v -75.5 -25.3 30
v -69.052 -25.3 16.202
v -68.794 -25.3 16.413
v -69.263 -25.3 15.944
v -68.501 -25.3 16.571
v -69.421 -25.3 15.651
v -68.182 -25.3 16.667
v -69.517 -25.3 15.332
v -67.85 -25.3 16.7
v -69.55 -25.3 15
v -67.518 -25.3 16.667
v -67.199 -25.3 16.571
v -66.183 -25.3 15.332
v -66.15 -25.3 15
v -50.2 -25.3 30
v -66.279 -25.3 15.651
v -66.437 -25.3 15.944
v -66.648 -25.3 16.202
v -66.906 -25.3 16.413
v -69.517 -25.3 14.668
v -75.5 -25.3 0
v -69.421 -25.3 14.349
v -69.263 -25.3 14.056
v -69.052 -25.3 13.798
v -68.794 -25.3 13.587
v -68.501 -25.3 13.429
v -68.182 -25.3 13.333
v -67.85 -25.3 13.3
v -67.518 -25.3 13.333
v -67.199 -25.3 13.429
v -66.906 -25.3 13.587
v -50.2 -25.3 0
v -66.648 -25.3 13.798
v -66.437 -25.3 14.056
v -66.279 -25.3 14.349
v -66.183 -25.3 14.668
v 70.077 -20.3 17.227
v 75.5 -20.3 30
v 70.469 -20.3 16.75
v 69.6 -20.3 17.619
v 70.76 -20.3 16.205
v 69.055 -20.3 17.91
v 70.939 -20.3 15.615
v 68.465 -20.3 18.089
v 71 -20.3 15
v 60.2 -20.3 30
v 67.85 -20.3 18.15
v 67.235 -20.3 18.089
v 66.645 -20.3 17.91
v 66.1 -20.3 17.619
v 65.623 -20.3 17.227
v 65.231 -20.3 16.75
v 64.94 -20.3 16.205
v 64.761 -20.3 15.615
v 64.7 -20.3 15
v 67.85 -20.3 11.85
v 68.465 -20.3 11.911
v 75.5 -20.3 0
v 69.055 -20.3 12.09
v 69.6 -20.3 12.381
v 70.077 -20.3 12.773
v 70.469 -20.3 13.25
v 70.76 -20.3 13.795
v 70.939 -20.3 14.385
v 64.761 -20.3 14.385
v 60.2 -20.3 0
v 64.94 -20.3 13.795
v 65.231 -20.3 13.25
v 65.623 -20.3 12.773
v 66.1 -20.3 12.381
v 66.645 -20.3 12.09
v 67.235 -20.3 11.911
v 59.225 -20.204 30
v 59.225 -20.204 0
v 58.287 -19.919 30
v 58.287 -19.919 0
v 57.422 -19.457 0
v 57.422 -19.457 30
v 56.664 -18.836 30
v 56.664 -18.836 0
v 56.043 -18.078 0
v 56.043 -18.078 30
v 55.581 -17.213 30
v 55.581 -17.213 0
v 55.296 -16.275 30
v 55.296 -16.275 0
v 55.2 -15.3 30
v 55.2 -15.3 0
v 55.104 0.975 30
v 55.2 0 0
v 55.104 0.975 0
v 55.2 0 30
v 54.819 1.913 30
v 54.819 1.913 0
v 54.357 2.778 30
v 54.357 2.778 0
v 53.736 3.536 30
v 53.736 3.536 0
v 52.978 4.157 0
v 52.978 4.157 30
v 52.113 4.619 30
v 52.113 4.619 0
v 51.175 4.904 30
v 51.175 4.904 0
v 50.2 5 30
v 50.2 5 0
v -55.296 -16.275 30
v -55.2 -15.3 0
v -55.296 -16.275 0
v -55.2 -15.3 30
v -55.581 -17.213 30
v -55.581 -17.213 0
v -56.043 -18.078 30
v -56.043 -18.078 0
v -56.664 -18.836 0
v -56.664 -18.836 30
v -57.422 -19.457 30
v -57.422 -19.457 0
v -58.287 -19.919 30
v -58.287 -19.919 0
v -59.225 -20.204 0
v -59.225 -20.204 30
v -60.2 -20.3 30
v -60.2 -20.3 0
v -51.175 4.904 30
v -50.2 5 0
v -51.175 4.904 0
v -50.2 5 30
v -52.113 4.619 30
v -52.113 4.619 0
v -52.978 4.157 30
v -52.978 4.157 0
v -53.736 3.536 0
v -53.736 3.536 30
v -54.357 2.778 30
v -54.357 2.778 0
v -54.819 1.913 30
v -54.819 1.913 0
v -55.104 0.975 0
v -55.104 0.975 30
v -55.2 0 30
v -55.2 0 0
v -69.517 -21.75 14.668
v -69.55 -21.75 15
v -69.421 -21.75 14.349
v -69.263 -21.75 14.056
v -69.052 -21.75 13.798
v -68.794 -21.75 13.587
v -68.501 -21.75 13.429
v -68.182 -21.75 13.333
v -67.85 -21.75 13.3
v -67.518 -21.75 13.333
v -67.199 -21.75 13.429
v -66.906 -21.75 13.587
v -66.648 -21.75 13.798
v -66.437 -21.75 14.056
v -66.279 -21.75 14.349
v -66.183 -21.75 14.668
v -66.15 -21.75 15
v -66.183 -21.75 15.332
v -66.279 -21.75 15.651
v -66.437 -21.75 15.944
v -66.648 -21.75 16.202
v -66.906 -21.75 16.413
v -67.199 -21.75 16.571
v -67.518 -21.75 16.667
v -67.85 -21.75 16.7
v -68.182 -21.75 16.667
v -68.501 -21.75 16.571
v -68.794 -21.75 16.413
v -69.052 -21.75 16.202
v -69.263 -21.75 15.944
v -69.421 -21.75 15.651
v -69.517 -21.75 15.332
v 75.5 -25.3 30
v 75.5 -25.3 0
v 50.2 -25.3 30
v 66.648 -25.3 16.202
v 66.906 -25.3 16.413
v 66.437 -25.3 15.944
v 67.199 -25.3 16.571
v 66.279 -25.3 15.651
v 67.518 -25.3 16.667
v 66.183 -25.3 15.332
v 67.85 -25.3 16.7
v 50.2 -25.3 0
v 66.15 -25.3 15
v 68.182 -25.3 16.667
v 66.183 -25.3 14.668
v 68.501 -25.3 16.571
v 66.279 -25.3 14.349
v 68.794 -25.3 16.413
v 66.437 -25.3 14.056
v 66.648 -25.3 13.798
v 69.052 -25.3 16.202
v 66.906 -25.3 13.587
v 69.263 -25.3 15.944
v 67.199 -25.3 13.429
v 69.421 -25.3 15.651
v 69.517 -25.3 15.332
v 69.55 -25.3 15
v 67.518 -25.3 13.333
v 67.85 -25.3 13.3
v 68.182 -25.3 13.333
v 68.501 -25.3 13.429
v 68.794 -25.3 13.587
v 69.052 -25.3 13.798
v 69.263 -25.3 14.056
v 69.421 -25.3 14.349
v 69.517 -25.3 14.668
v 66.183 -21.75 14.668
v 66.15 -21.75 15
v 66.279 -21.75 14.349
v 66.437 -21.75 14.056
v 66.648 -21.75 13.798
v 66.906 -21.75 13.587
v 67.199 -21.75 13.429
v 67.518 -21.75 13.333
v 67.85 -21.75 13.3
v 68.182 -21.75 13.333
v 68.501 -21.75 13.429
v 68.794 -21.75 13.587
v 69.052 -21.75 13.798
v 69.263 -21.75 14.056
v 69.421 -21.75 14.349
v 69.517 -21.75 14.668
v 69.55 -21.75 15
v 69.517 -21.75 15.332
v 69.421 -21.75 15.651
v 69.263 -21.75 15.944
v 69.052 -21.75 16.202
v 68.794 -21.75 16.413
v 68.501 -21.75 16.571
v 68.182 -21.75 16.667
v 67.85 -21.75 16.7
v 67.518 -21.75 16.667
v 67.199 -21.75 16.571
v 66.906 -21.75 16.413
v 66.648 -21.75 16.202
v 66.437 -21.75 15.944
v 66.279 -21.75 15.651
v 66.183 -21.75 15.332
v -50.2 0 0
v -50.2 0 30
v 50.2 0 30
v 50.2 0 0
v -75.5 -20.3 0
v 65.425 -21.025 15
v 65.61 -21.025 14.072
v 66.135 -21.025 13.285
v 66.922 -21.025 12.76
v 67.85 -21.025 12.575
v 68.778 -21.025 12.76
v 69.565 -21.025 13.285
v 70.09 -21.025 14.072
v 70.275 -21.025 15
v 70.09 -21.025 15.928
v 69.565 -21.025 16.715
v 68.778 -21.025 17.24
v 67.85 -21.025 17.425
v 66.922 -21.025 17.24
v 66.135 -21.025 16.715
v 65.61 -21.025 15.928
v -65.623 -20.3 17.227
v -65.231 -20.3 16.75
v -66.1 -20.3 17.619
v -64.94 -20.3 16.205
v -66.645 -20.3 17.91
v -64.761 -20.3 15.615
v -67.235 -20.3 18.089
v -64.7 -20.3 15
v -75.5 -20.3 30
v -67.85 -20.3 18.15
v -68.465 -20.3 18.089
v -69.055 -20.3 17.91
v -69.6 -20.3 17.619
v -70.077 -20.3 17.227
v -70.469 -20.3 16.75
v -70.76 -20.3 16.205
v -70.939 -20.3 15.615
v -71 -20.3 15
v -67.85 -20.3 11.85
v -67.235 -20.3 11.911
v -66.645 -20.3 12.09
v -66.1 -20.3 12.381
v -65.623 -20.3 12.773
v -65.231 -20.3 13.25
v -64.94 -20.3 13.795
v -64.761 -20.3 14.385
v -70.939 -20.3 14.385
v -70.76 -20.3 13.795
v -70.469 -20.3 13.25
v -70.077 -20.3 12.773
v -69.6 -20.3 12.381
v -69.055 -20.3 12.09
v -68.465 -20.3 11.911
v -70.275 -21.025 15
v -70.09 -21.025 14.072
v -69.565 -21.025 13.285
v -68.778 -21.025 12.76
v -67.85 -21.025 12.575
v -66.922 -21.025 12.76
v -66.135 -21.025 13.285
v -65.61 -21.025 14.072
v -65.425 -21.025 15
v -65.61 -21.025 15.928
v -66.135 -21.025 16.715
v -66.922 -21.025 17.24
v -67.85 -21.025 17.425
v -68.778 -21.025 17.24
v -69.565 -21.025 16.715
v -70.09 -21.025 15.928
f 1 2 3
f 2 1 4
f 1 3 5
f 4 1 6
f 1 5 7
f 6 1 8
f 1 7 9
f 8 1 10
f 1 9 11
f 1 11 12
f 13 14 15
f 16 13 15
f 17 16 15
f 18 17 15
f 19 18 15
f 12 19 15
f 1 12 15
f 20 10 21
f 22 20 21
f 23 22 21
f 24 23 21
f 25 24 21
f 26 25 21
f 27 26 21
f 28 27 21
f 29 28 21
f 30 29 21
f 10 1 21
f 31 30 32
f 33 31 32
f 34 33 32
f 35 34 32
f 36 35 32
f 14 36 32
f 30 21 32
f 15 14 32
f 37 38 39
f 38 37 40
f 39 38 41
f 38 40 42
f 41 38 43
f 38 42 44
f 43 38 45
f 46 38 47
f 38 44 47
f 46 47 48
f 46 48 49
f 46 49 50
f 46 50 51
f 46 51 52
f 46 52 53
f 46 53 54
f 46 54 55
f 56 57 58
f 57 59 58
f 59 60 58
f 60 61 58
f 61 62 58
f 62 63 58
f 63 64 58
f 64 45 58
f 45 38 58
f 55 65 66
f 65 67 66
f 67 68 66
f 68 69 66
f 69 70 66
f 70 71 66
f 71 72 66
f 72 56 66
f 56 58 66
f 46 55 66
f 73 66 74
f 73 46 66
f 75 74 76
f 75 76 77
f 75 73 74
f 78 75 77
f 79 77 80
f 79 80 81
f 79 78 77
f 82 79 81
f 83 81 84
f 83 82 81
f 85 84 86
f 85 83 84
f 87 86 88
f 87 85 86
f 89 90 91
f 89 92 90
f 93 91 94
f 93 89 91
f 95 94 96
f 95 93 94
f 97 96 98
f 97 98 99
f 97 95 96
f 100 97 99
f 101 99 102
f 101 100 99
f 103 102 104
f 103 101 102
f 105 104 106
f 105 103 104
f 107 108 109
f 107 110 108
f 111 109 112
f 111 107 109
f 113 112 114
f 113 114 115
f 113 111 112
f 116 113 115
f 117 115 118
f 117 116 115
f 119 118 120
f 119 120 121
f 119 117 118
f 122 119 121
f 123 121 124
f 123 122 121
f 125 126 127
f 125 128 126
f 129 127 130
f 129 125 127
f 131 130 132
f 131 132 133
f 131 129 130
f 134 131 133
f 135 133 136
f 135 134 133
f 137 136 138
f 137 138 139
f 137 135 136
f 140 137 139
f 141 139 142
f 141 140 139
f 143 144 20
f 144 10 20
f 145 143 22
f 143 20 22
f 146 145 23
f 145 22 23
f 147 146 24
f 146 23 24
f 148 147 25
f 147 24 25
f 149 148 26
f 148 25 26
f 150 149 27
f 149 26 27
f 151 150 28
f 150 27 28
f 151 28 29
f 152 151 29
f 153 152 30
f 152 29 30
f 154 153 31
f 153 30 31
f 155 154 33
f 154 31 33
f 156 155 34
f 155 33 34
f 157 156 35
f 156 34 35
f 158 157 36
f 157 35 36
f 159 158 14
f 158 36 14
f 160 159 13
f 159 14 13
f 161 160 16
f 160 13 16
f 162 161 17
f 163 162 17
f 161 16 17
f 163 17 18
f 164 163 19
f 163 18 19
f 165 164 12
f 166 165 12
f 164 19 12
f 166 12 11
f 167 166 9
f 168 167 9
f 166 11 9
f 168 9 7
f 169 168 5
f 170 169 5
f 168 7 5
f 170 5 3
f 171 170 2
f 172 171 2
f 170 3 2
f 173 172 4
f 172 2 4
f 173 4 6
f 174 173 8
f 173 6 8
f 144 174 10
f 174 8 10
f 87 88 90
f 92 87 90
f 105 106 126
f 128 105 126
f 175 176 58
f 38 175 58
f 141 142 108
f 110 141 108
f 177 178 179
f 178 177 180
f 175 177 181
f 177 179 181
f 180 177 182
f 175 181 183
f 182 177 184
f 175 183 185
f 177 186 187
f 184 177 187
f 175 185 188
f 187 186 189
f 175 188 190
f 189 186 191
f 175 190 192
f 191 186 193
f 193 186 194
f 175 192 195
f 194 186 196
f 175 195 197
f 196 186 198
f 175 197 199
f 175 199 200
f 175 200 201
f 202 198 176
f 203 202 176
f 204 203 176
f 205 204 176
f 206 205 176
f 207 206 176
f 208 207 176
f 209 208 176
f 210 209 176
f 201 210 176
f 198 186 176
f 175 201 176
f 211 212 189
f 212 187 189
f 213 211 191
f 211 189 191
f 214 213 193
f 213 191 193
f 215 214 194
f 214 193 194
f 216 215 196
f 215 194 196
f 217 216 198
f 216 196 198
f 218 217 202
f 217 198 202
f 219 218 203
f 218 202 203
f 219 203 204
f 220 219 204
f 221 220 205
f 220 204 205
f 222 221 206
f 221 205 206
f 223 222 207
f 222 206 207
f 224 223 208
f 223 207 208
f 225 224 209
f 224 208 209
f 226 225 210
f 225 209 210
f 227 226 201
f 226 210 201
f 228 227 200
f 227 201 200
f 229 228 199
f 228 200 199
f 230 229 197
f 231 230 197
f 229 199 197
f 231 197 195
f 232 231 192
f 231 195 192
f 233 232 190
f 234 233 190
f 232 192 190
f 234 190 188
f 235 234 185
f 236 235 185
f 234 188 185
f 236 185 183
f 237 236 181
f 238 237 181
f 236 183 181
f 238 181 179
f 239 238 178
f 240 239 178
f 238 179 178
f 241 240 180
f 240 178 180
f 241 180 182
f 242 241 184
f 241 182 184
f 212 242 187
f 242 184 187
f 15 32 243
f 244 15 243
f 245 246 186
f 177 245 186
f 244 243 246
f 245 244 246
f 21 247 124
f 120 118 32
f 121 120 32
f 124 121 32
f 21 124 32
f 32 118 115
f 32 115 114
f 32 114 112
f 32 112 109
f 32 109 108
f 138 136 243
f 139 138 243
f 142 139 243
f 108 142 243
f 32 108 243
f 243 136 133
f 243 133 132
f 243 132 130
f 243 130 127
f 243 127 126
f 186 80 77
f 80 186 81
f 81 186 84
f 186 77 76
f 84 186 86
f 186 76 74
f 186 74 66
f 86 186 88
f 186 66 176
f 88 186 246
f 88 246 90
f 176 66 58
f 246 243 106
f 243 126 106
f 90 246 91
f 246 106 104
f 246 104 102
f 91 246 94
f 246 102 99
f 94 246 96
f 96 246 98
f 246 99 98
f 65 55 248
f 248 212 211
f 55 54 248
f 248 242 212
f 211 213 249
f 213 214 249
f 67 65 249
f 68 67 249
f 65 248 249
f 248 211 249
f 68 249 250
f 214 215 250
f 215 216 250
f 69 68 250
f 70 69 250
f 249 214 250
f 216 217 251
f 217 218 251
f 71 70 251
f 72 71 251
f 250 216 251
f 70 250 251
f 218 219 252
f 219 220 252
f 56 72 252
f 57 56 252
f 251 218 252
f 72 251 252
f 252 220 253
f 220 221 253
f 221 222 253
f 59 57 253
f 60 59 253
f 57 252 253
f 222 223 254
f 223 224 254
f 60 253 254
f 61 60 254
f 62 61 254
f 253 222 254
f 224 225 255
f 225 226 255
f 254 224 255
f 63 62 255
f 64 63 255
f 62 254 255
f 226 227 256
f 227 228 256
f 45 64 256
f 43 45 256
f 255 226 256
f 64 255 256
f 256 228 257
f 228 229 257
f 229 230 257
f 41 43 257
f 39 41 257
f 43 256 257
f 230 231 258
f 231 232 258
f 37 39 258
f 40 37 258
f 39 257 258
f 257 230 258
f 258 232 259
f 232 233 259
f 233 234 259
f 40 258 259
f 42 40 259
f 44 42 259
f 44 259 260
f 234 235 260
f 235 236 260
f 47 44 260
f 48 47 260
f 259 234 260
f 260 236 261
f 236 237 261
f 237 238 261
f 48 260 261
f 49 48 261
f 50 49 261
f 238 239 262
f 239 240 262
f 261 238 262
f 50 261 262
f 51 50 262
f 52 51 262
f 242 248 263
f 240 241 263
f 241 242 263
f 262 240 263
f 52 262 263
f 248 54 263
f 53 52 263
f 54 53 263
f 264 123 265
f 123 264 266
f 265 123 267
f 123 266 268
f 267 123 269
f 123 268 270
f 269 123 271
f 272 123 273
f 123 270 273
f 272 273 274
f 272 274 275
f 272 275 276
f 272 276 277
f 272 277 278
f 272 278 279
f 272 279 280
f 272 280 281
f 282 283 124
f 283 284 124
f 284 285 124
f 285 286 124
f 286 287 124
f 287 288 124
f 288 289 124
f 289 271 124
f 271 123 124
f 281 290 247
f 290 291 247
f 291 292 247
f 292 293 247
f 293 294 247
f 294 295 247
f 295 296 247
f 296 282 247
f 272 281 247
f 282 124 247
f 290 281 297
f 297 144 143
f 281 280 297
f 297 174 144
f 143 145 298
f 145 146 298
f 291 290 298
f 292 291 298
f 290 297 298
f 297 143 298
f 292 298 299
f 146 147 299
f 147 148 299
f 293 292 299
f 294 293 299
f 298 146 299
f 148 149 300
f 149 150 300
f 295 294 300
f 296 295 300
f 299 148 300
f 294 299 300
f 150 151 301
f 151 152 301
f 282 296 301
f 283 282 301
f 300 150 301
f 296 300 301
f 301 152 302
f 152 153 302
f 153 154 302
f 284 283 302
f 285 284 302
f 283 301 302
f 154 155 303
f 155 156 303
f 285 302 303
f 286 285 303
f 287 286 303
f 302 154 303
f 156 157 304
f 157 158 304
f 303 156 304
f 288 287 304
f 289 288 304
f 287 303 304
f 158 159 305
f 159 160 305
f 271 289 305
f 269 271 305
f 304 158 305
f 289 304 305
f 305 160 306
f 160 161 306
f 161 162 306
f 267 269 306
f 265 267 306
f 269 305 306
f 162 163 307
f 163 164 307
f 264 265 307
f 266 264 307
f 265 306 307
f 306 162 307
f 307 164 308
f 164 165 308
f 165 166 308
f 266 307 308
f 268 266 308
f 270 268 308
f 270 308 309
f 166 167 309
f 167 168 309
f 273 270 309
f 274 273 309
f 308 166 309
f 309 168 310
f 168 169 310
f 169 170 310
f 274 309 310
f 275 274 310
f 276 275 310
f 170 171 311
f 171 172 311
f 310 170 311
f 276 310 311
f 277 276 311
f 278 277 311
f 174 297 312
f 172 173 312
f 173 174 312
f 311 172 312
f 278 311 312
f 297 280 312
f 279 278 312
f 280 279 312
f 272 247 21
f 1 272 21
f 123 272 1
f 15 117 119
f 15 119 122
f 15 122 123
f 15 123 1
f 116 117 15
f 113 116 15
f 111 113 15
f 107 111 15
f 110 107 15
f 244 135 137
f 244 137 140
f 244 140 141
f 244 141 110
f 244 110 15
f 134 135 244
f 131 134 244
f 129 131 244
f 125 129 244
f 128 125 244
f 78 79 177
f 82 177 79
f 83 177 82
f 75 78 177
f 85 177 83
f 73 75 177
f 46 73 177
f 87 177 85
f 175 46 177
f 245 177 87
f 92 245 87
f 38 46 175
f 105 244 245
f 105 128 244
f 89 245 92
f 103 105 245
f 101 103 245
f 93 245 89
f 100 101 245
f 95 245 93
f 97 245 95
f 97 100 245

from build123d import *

# Parameters (mm, degrees)
BOSS_EXTRU_1_DEPTH                             = 30
CONG_1_R                                       = 5
FRAISAGE_POUR_VIS_T_TE_FRAIS_E_M31_D           = 3.4
FRAISAGE_POUR_VIS_T_TE_FRAIS_E_M31_CSINK_D     = 6.3
FRAISAGE_POUR_VIS_T_TE_FRAIS_E_M31_CSINK_ANGLE = 90


with BuildPart() as part:
    # Esquisse1 → Boss.-Extru.1 (new body)
    with BuildSketch(Plane.XY):
        Polygon((-50.2, 0), (50.2, 0), (50.2, -25.3), (75.5, -25.3), (75.5, -20.3), (55.2, -20.3), (55.2, 5), (-55.2, 5), (-55.2, -20.3), (-75.5, -20.3), (-75.5, -25.3), (-50.2, -25.3), align=None)
    extrude(amount=BOSS_EXTRU_1_DEPTH)

    # Congé1
    cong_1_edges = [part.edges().sort_by_distance(p)[0] for p in [
        (-55.2, -20.3, 15),
        (-55.2, 5, 15),
        (55.2, 5, 15),
        (55.2, -20.3, 15),
    ]]
    fillet(cong_1_edges, radius=CONG_1_R)

    # Fraisage pour vis à tête fraisée M31 (through all)
    with Locations(Plane(origin=(0, -20.3, 0), x_dir=(1, 0, 0), z_dir=(0, 1, 0))):
        with Locations((-67.85, -15), (67.85, -15)):
            CounterSinkHole(FRAISAGE_POUR_VIS_T_TE_FRAIS_E_M31_D / 2, FRAISAGE_POUR_VIS_T_TE_FRAIS_E_M31_CSINK_D / 2, counter_sink_angle=FRAISAGE_POUR_VIS_T_TE_FRAIS_E_M31_CSINK_ANGLE)


solid = part.part
